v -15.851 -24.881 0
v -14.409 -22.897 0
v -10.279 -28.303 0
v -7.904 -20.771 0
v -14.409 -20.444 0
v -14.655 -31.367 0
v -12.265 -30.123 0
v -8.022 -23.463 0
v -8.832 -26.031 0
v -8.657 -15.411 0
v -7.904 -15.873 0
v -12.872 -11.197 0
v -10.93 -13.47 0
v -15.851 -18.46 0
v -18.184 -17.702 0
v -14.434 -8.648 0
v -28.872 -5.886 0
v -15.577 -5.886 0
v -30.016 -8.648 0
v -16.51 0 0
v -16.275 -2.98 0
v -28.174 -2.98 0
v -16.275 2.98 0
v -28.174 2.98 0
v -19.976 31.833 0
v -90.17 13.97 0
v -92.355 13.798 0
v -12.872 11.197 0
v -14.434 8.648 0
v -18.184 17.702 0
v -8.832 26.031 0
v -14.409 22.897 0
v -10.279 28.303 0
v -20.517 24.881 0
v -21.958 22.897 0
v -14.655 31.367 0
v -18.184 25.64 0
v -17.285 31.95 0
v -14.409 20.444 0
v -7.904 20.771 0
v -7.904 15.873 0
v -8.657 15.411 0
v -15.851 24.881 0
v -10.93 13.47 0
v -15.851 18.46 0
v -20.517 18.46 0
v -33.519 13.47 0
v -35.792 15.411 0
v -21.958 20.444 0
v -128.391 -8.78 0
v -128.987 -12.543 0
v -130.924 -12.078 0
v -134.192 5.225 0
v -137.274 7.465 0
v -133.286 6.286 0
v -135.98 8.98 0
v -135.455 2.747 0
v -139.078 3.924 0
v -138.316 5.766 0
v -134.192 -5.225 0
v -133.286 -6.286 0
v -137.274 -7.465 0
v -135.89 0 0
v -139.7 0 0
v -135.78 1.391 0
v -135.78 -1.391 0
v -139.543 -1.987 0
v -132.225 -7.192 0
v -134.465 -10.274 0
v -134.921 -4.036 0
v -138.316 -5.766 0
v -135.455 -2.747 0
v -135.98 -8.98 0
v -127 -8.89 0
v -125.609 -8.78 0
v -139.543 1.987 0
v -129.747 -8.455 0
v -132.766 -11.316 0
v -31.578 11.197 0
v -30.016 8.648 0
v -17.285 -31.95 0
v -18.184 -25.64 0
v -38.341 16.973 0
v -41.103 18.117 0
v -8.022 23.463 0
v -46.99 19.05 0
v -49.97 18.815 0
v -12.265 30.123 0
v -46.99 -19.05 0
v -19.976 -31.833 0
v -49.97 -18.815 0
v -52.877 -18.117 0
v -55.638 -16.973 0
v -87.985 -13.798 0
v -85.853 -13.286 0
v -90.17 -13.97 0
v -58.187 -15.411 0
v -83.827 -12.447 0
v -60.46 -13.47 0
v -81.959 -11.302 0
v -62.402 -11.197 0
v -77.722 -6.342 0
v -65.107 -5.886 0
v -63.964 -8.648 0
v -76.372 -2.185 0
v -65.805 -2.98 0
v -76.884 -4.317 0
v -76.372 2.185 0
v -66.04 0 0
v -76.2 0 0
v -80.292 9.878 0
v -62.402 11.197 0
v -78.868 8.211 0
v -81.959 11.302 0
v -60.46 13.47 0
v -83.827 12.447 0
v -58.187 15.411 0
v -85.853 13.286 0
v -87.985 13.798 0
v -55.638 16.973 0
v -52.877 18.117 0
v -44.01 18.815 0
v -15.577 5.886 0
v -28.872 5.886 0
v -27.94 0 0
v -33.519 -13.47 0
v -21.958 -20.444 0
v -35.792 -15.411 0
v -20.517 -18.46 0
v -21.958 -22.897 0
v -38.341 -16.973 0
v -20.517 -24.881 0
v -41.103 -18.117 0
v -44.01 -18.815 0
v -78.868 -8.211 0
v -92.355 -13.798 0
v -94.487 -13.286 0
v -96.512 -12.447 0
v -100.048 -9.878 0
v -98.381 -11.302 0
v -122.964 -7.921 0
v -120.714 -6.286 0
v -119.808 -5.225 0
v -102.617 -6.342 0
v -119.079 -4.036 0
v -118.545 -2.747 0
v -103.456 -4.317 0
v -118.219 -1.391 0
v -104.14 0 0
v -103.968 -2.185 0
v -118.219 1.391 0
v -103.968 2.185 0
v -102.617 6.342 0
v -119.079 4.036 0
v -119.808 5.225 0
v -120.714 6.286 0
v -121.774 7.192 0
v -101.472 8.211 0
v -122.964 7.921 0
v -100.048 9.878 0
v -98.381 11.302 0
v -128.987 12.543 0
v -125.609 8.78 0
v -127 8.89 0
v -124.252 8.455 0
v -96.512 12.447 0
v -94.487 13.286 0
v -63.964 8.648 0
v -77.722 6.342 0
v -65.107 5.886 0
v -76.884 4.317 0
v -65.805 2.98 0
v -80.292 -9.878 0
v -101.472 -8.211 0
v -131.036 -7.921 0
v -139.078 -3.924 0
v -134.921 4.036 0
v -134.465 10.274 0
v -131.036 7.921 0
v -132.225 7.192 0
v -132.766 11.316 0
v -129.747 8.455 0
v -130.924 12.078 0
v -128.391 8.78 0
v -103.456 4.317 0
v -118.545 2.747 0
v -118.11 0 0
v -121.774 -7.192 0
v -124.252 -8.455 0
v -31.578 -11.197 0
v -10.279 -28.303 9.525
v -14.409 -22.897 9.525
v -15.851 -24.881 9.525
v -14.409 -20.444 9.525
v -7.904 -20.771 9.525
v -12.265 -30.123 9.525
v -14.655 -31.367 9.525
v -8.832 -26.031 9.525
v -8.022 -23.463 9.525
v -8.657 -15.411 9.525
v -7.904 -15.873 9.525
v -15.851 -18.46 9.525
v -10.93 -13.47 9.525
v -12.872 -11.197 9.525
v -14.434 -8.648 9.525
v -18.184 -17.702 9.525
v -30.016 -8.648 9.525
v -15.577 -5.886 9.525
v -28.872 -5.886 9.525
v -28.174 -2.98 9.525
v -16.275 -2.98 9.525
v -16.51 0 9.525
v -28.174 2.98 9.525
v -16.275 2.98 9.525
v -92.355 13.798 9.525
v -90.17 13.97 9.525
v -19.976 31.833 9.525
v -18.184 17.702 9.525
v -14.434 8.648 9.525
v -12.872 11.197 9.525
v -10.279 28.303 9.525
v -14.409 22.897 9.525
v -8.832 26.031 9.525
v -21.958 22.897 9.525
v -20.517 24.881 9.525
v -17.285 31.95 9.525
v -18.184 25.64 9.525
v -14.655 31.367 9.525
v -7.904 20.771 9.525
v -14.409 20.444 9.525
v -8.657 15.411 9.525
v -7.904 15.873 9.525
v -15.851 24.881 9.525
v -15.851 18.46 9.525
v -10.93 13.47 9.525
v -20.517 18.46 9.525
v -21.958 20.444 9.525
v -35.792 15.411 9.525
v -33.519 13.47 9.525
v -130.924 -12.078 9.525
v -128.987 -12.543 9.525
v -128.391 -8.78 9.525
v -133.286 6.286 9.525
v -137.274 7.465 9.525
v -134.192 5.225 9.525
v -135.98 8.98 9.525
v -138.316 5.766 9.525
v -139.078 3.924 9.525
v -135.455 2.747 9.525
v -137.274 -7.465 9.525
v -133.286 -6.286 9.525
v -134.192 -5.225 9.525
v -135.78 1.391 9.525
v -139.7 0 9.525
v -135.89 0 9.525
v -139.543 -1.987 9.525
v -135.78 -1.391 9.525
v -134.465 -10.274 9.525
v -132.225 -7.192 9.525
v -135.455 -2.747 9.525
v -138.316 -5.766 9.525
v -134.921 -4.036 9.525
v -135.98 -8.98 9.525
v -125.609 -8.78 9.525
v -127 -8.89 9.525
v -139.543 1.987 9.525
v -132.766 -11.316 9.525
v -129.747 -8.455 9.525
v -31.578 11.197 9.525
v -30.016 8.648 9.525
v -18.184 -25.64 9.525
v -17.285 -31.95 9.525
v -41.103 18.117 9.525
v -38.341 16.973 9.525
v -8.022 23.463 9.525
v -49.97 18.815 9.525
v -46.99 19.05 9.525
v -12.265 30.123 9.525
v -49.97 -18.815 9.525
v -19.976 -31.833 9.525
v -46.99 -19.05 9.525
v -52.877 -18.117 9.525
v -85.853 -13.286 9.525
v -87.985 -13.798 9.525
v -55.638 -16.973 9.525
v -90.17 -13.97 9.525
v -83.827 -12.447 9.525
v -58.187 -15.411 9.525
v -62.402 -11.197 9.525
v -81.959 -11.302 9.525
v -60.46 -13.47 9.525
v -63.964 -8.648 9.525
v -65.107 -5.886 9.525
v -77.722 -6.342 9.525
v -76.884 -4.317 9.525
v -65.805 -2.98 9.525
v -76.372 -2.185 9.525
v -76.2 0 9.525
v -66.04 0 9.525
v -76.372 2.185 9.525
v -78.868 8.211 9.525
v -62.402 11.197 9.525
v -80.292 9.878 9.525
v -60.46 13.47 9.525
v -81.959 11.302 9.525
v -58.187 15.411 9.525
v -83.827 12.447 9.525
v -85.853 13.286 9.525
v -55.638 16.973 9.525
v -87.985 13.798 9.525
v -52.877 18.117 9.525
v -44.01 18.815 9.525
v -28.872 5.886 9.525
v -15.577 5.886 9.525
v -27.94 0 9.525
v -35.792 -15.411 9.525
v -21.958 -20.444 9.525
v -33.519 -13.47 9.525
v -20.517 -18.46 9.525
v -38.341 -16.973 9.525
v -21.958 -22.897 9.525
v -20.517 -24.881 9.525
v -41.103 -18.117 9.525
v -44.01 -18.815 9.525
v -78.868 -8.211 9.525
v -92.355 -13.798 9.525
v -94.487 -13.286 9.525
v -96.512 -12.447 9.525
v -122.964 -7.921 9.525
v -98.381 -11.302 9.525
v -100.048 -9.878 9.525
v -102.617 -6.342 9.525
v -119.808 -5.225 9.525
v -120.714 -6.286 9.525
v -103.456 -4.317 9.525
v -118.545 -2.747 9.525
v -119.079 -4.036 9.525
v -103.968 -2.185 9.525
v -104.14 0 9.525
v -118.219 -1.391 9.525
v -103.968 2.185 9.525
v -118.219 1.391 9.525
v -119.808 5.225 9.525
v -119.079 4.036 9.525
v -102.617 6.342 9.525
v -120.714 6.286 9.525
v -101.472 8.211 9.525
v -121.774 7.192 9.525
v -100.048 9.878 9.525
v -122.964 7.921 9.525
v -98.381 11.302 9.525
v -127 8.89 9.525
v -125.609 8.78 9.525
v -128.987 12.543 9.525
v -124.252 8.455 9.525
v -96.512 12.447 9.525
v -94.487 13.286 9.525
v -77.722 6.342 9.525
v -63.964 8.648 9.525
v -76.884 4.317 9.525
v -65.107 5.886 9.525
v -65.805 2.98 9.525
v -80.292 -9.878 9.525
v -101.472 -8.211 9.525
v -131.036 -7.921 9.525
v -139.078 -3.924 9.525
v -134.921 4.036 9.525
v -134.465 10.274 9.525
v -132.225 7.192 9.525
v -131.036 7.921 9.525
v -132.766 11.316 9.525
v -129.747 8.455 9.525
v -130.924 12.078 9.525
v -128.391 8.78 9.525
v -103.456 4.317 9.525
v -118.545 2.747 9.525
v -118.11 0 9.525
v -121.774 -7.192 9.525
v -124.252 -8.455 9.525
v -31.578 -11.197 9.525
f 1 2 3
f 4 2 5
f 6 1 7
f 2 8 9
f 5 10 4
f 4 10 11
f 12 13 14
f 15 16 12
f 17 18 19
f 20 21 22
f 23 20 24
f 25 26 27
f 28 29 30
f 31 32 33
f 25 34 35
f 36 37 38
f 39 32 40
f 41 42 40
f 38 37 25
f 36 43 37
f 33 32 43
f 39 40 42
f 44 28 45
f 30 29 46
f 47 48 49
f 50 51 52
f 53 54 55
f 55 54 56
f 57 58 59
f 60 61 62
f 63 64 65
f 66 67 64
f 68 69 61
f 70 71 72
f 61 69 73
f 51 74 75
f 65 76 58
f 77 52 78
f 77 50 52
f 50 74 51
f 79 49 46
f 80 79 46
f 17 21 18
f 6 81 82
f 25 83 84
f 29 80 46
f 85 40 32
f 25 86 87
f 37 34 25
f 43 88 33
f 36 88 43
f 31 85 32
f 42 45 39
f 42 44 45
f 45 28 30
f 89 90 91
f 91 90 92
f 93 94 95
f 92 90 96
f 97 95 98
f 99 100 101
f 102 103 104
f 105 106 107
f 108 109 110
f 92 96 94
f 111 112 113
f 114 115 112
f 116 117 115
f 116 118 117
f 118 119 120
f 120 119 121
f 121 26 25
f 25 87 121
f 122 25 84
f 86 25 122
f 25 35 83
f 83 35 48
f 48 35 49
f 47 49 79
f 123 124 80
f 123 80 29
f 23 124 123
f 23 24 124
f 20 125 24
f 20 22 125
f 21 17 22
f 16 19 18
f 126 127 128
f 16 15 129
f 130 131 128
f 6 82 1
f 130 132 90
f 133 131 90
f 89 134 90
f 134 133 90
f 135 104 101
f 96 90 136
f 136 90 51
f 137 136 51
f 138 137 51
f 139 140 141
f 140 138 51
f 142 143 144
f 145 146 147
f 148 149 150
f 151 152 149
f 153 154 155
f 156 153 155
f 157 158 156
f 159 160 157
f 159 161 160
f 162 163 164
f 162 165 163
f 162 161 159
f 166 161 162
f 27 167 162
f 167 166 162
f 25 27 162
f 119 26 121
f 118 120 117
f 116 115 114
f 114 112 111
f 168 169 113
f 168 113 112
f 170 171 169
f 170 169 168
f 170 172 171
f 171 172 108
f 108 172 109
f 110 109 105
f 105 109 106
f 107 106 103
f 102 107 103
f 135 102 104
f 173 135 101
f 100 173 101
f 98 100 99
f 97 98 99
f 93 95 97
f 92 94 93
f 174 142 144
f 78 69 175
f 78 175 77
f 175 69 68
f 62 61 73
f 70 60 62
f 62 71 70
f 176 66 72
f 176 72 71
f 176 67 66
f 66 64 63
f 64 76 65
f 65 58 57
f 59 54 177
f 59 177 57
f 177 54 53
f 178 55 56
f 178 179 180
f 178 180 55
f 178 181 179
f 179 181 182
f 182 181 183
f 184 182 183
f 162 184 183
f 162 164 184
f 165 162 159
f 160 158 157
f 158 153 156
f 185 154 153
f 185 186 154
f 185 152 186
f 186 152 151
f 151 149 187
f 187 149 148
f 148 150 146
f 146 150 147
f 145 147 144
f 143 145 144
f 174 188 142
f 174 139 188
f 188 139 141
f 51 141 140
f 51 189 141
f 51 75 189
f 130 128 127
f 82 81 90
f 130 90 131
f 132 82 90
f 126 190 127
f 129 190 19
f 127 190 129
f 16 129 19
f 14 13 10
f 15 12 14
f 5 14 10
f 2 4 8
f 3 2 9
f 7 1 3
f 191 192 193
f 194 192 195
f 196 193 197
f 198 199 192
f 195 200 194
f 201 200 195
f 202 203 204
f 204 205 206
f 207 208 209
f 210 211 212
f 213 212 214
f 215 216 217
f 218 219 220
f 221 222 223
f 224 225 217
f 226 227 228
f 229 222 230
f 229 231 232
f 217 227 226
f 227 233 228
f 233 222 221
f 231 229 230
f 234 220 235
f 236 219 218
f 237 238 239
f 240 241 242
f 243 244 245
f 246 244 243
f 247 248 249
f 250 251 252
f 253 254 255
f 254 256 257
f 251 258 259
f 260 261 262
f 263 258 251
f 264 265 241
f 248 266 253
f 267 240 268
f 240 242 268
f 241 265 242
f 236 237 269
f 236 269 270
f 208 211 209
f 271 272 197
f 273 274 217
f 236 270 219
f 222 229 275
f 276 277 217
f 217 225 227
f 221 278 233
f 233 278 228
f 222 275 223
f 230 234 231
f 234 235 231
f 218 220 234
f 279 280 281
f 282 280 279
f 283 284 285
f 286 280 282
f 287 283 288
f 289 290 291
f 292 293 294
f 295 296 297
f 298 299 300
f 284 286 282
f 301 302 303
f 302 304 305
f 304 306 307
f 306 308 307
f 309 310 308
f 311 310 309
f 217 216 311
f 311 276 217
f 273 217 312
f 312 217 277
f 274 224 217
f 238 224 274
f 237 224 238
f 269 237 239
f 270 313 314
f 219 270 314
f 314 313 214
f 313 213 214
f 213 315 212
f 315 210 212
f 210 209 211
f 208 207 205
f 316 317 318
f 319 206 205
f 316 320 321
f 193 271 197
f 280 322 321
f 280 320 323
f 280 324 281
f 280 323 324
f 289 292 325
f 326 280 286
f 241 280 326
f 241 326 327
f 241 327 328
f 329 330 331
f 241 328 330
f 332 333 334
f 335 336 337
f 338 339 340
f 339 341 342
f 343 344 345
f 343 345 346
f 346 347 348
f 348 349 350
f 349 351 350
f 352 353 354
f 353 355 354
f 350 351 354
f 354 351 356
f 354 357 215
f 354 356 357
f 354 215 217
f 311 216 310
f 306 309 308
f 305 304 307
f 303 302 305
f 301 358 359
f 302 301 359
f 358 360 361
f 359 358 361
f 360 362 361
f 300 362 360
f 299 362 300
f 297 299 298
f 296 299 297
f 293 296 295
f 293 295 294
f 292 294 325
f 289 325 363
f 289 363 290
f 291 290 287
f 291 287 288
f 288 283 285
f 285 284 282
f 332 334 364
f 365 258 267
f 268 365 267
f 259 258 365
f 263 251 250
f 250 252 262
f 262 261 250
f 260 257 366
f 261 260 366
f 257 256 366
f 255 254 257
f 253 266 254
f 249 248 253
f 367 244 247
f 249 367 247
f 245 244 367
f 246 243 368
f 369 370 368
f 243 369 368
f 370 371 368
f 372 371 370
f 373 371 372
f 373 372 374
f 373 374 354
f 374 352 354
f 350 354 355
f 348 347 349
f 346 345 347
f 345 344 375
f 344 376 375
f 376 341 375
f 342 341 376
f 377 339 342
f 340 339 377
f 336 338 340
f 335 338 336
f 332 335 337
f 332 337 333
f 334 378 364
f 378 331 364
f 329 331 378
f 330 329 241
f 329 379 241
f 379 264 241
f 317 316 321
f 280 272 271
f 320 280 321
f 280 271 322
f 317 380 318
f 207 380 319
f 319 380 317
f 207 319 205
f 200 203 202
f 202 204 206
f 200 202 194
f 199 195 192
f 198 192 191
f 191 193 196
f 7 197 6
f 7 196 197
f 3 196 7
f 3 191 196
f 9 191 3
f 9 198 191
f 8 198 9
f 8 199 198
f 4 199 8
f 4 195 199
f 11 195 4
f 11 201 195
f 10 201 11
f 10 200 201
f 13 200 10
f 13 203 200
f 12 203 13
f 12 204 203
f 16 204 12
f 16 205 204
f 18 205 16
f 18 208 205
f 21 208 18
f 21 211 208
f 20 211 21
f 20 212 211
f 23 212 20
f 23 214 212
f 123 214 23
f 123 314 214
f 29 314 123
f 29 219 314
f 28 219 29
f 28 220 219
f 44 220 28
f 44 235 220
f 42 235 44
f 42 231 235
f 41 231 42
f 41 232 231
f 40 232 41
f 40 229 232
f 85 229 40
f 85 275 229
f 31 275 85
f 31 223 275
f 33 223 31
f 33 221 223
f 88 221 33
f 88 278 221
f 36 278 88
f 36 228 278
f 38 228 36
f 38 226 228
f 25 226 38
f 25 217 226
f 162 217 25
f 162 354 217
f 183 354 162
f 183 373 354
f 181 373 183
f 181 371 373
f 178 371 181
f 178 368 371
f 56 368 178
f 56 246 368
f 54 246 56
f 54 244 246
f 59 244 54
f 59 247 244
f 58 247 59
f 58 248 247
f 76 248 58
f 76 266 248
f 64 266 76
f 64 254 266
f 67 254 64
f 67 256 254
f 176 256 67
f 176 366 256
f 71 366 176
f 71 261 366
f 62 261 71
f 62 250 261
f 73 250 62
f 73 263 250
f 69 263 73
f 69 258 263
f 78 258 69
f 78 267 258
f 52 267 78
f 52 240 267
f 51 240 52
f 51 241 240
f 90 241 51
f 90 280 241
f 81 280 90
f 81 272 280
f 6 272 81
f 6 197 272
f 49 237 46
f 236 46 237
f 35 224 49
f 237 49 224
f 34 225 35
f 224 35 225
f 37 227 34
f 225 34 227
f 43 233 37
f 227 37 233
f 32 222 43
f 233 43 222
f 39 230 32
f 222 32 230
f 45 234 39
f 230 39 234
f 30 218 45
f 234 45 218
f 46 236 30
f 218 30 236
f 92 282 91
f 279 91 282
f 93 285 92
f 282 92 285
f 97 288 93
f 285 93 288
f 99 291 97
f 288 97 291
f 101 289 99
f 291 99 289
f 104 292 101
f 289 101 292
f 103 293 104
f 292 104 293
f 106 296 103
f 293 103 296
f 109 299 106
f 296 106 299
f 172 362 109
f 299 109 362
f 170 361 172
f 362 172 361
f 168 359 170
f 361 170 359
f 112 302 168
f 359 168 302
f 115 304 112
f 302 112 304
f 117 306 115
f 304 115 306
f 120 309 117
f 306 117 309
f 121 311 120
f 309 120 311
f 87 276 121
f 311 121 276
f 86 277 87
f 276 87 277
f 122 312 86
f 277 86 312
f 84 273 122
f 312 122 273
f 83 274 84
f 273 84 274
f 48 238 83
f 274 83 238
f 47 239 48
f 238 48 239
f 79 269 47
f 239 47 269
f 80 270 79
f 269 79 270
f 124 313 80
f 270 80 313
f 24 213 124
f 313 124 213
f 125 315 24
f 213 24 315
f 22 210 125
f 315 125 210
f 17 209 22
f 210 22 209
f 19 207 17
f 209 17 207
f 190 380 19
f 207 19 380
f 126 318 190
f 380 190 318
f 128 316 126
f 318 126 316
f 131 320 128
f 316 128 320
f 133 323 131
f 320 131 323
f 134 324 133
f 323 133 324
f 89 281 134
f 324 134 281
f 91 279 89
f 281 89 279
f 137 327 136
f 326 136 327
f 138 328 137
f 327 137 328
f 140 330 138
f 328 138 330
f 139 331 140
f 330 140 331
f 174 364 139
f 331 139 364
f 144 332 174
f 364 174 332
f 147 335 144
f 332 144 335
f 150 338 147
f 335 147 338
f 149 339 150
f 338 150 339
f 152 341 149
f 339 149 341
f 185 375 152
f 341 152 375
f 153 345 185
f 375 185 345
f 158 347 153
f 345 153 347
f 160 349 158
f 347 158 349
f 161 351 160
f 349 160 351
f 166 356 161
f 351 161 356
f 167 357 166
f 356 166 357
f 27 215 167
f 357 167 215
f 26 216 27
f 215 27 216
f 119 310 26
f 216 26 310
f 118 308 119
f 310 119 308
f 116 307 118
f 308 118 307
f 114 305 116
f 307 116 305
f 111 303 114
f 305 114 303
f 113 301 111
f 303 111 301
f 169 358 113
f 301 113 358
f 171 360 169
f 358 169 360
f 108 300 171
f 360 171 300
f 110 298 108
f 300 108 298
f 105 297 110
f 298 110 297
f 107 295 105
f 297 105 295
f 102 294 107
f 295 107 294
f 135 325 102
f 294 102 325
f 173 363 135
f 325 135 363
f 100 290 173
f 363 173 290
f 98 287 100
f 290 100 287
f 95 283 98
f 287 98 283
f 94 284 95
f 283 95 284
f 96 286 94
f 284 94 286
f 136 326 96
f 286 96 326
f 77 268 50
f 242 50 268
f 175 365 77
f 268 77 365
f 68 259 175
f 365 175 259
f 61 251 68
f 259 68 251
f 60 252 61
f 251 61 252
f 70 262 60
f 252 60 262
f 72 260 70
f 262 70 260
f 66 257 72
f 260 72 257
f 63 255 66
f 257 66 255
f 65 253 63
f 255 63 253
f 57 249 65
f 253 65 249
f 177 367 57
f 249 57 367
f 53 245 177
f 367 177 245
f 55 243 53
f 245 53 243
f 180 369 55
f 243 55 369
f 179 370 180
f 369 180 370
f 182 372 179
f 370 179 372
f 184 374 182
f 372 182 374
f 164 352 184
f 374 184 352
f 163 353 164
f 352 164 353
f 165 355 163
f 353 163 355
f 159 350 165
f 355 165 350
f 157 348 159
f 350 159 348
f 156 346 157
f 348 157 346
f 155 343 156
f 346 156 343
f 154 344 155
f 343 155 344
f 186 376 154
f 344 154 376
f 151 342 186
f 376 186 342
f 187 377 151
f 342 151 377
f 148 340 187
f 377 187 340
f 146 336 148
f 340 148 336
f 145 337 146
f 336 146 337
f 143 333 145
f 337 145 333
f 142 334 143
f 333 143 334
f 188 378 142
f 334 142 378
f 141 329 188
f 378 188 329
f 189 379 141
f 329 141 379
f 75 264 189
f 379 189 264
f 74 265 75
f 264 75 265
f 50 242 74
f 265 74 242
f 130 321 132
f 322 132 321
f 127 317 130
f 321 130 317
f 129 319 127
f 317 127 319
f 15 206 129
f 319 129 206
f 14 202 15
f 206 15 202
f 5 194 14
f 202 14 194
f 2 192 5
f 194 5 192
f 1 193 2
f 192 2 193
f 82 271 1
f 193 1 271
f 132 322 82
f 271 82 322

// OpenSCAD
// file: ../Math/Triangles.scad
// Pythagorean Theorem
function pyth_A_B(a,b) = sqrt(pow(a, 2) + pow(b, 2));
function pyth_A_C(a,c) = sqrt(pow(c, 2) - pow(a, 2));
function pyth_B_C(b,c) = sqrt(pow(c, 2) - pow(b, 2));

// Heron's Formula for Triangle Area
function heron_triangle_area(a,b,c) = sqrt(
    ((a+b+c)/2)
    * (((a+b+c)/2) - a)
    * (((a+b+c)/2) - b)
    * (((a+b+c)/2) - c)
  );

function heron_triangle_height(a,b,c) = 2 * heron_triangle_area(a,b,c) / c;
// file: ../Components.scad
include <Math/Triangles.scad>;
include <Vitamins/Angle Stock.scad>;
include <Vitamins/Pipe.scad>;
include <Vitamins/Rod.scad>;

//
// Component Dimensions
//
$fn=60;

// Fascist Settings
overall_length = 26.5;
barrel_length = 18.5;

// Configurable: Wall Thickness
tee_overlap             = 3/16;

rope_od                 = 6/32;

// Configurable: Cylinder
cylinder_spindle_diameter    = 1/8;
cylinder_spindle_wall        = 5/16;
revolver_cylinder_wall       = PipeWall(PipeOneInch);
revolver_cylinder_outer_wall = 3/64;
spindle_overlap              = revolver_cylinder_wall;
revolver_zigzag_pin_diameter = 4/32;
revolver_zigzag_depth        = 3/16;
revolver_shots               = 6;
zigzag_clearance             = 1/64;
chamber_length               = 3;
chamber_seal_overlap         = 1/4;
spindle_collar_diameter      = 0.505;
spindle_collar_height        = 0.27;
actuator_cylinder_clearance  = 0.1;

// Configurable: Vitamin Selection
railRod        = RodFiveSixteenthInch;
breechBushing  = BushingThreeQuarterInch;
barrelPipe     = TubingOnePointOneTwoFive;
stockPipe      = PipeThreeQuartersInch;
receiverTee    = TeeThreeQuarterInch;
gasSealingPipe = PipeOneInch;

// Configurable: Common Settings
bottomRailAngle = 50;

// Configurable: Forend
forend_length = 2;
forend_wall_thickness = 3/16;

// AR15 grip info
grip_width                 = 0.85;
grip_height                = 1.27;


// Calculated: Revolver Cylinder
zigzag_width = revolver_zigzag_pin_diameter + zigzag_clearance*2;
revolver_cylinder_radius = (PipeOuterDiameter(PipeThreeQuartersInch)*1.5)+revolver_cylinder_wall + revolver_cylinder_outer_wall + revolver_zigzag_depth;
revolver_cylinder_od   = revolver_cylinder_radius*2;
cylinder_circumference = 3.14 * pow(revolver_cylinder_od/2, 2);
revolver_center_offset = PipeOuterDiameter(PipeThreeQuartersInch) + revolver_cylinder_wall;
rotation_angle = 360/revolver_shots;
rotation_arc = cylinder_circumference/revolver_shots;
zigzag_height = rotation_arc/2 + revolver_zigzag_pin_diameter*2;
revolver_cylinder_height = zigzag_height + revolver_zigzag_pin_diameter*2.5;
chamber_protrusion = (chamber_length - revolver_cylinder_height)/2;

top_slot_height = revolver_zigzag_pin_diameter*2;
bottom_slot_height = revolver_zigzag_pin_diameter*2 + zigzag_clearance*1.5;
// file: ../Vitamins/Angle Stock.scad
AngleStockWidth                   = 1;
AngleStockThickness               = 2;
AngleStockTrough                  = 3; // Thickness across the "elbow" of the angle
AngleStockWidthClearanceSnug      = 4;
AngleStockWidthClearanceLoose     = 5;
AngleStockThicknessClearanceSnug  = 6;
AngleStockThicknessClearanceLoose = 7;
AngleStockHeight                  = 8;

// .747
// .744
// .745
//.740


//.749
//.75
AngleStockThreeQuartersByOneEighthInch = [
  [AngleStockWidth,                   0.771],
  [AngleStockThickness,               0.13],
  [AngleStockTrough,                  0.235],
  [AngleStockWidthClearanceSnug,      0.008],
  [AngleStockWidthClearanceLoose,     0.015],
  [AngleStockThicknessClearanceSnug,  0.007],
  [AngleStockThicknessClearanceLoose, 0.008],
  [AngleStockHeight,                  0.574]
];

3_4_angle_stock_width                     = 3/4;
3_4_angle_stock_thickness                 = 0.13;
3_4_angle_stock_trough                    = 0.235;
3_4_angle_stock_height                    = 0.574;
3_4_angle_stock_width_clearance           = 0.008;
3_4_angle_stock_width_clearance_loose     = 0.008;
3_4_angle_stock_thickness_clearance       = 0.005;
3_4_angle_stock_thickness_clearance_loose = 0.007;

// trough is a percentage: 0.0-1.0
module AngleStock(stock=AngleStockThreeQuartersByOneEighthInch, trough=.5, thicknessClearance=AngleStockThicknessClearanceLoose, widthClearance=AngleStockWidthClearanceLoose, length=1) {

  // A percentage of the inner-side length (width - thickness)
  clearThicknessOffset = thicknessClearance != undef ? lookup(thicknessClearance, stock) : 0;
  clearWidthOffset     = widthClearance     != undef ? lookup(widthClearance, stock)     : 0;
  troughOffset         = (trough * (lookup(AngleStockWidth, stock) - lookup(AngleStockThickness, stock))) + lookup(AngleStockThickness, stock);

  linear_extrude(height=length)
  polygon(points=[[0,0],
                  [lookup(AngleStockWidth, stock)+clearWidthOffset,0],                                                         // X-POS Outer Corner
                  [lookup(AngleStockWidth, stock)+clearWidthOffset,lookup(AngleStockThickness, stock)+clearThicknessOffset],   // X-POS Inner Corner
                  [troughOffset,lookup(AngleStockThickness, stock)+clearThicknessOffset],                                      // X-POS Trough
                  [lookup(AngleStockThickness, stock)+clearThicknessOffset,troughOffset],                                      // Y-POS Trough
                  [lookup(AngleStockThickness, stock)+clearThicknessOffset,lookup(AngleStockWidth, stock)+clearWidthOffset],   // Y-POS Inner Corner
                  [0,lookup(AngleStockWidth, stock)+clearWidthOffset],                                                         // Y-POS Outer Corner
          ],
          paths=[[0,1,2,3,4,5,6]]);
}


//#AngleStock();

module 3_4_angle_stock(length=1, cutter=false, loose=false) {
  width_clearance     = loose ? 3_4_angle_stock_width_clearance_loose     : 3_4_angle_stock_width_clearance;
  thickness_clearance = loose ? 3_4_angle_stock_thickness_clearance_loose : 3_4_angle_stock_thickness_clearance;

  union() {
    if (cutter) {
      translate([-width_clearance,-thickness_clearance,0])
      cube([3_4_angle_stock_width     + width_clearance*2,
            3_4_angle_stock_thickness + thickness_clearance*2,
            length]);

      translate([-width_clearance,-thickness_clearance,0])
      cube([3_4_angle_stock_thickness + thickness_clearance*2,
            3_4_angle_stock_width     + width_clearance*2,
            length]);

      translate([3_4_angle_stock_thickness/2, 3_4_angle_stock_thickness/2, 0])
      difference() {
        cube([3_4_angle_stock_trough + thickness_clearance/2,
              3_4_angle_stock_trough + thickness_clearance/2,
              length]);

        translate([3_4_angle_stock_trough + thickness_clearance/2,
                   thickness_clearance/2,
                   -0.1])
        rotate([0,0,45])
        cube([3_4_angle_stock_trough*sqrt(2),
              3_4_angle_stock_trough*sqrt(2),
              length + 0.2]);
      }

    } else {
      cube([3_4_angle_stock_width,3_4_angle_stock_thickness,length]);
      cube([3_4_angle_stock_thickness,3_4_angle_stock_width,length]);

      translate([3_4_angle_stock_thickness, 3_4_angle_stock_thickness, 0])
      difference() {
        cube([3_4_angle_stock_trough, 3_4_angle_stock_trough,length]);

        translate([3_4_angle_stock_trough,0,-0.1])
        rotate([0,0,45])
        cube([3_4_angle_stock_trough*sqrt(2), 3_4_angle_stock_trough*sqrt(2),length + 0.2]);
      }
    }
  };
}
// file: ../Forend Rail.scad
include <Vitamins/Pipe.scad>;
include <Vitamins/Angle Stock.scad>;
include <Components.scad>;

function ForendRailOffset(receiverTee=receiverTee,
                          teeOverlap=tee_overlap,
                          railRod=railRod) =
      (lookup(TeeRimDiameter, receiverTee)/2) + teeOverlap
     + lookup(RodRadius, railRod);


module ForendRods(receiverTee=receiverTee, railRod=railRod,
                  clearance=undef, angles=[180,50,-50], rodFnAngle=90) {
    for (angle = angles)
    rotate([0,0,angle])
    translate([-ForendRailOffset(railRod=railRod), 0])
    rotate([0,0,-angle+rodFnAngle])
    Rod2d(rod=railRod, clearance=clearance);
}

module ForendRail(receiverTee=receiverTee, barrelPipe=barrelPipe,
                  railRod=railRod, railClearance=RodClearanceLoose,
                  wall=tee_overlap,angles=[180,50,-50]) {

  // Debugging reference
  *%TeeRim(receiverTee);

  difference() {
    hull()
    union() {
      for (angle = angles)
      rotate([0,0,angle])
      translate([-ForendRailOffset(railRod=railRod, teeOverlap=tee_overlap), 0])
      circle(r=RodRadius(railRod) + wall, $fn=24);

    }

    ForendRods(angles=angles, clearance=railClearance);
  }
}

*render(convexity=2)
linear_extrude(height=1)
ForendRail();
// file: ../Vitamins/Rod.scad
RodDiameter       = 1;
RodRadius         = 2;
RodClearanceSnug  = 3;
RodClearanceLoose = 4;
RodFn             = 5;

RodOneEighthInch = [
  [RodDiameter, 1/8],
  [RodRadius, 1/8/2],
  [RodClearanceSnug, 0.02],
  [RodClearanceLoose, 0.03],
  [RodFn, 8]
];

RodOneQuarterInch = [
  [RodDiameter,       1/4],
  [RodRadius,         1/4/2],
  [RodClearanceSnug,  0.027],
  [RodClearanceLoose, 0.035],
  [RodFn,             8]
];

RodFiveSixteenthInch = [
  [RodDiameter,       5/16],
  [RodRadius,         5/16/2],
  [RodClearanceSnug,  0.025],
  [RodClearanceLoose, 0.025],
  [RodFn,             10]
];

RodThreeQuarterInchTubing = [
  [RodDiameter,       0.758],
  [RodRadius,         0.758/2],
  [RodClearanceSnug,  0.023],
  [RodClearanceLoose, 0.029],
  [RodFn,             30]
];

/**
 * Lookup the diameter of a rod.
 * @param rod The rod to lookup.
 * @param clearance The RodClearance to use.
 */
function RodDiameter(rod=undef, clearance=undef)
           = lookup(RodDiameter, rod)
          + (clearance != undef ? lookup(clearance, rod) : 0);

/**
 * Lookup the radius of a rod.
 * @param rod The rod to lookup.
 * @param clearance The RodClearance to use.
 */
function RodRadius(rod, clearance=undef) = RodDiameter(rod, clearance)/2;

/**
 * Lookup the $fn value for a rod, optionally overriding it
 * @param rod The rod to lookup.
 * @param $fn Override the RodFn. If defined, this will be the result. (convenience arg)
 **/
function RodFn(rod, $fn=undef) = ($fn == undef) ? lookup(RodFn, rod) : $fn;

/**
 * A 2D rod (circle).
 * @param rod The rod to render.
 * @param clearance The RodClearance to use.
 * @param $fn Override the RodFn value of the rod.
 */
module Rod2d(rod=RodOneQuarterInch, clearance=undef, $fn=undef) {
  circle(r=RodRadius(rod, clearance),
         $fn=RodFn(rod, $fn));
}


module Rod(rod=RodOneQuarterInch, length=1, clearance=undef, center=false, $fn=undef) {
  render(convexity=1)
  linear_extrude(height=length, center=center)
  Rod2d(rod, clearance, $fn=$fn);
}

// 1/8" Rod
1_8_rod_d                = 1/8;
1_8_rod_r                = 1_8_rod_d/2;
1_8_rod_clearance        = 0.02;
1_8_rod_clearance_loose  = 0.03;

// 1/4" Rod
1_4_rod_d                = 1/4;
1_4_rod_r                = 1_4_rod_d/2;
1_4_rod_clearance        = 0.01;
1_4_rod_clearance_loose  = 0.015;
1_4_rod_collar_d         = 1/22;
1_4_rod_collar_width     = 0.27;
1_4_rod_collar_clearance = 0.0; // TODO

// 5/16" Rod
5_16_rod_d                = 5/16;
5_16_rod_r                = 5_16_rod_d/2;
5_16_rod_clearance        = 0.02; // TODO
5_16_rod_clearance_loose  = 0.02;

module rod(diameter=1, length=1, clearance=0, clearance_loose=0, loose=false, cutter=false, center=false, $fn=20) {
  clearance = loose ? clearance_loose : clearance;

  if (cutter) {
    cylinder(r=(diameter/2) + (loose ? clearance_loose : clearance), h=length, center=center);
  } else {
    cylinder(r=diameter/2, h=length, center=center);
  }
}

module 1_8_rod(length=1, loose=false, cutter=false, center=false) {
  rod(diameter=1_8_rod_d,
      clearance=1_8_rod_clearance,
      clearance_loose=1_8_rod_clearance_loose,
      length=length,
      cutter=cutter,
      center=center);
}

module 1_4_rod(length=1, loose=false, cutter=false, center=false) {
  rod(diameter=1_4_rod_d,
      clearance=1_4_rod_clearance,
      clearance_loose=1_4_rod_clearance_loose,
      loose=loose,
      length=length,
      cutter=cutter,
      center=center);
}

module 1_4_rod_collar(cutter=false) {
  rod(diameter=1_4_rod_collar_d,
      clearance=1_4_rod_collar_clearance,
      cutter=cutter,
      length=1_4_rod_collar_width);
}

module 5_16_rod(length=1, loose=false, cutter=false, center=false) {
  rod(diameter=5_16_rod_d,
      clearance=5_16_rod_clearance,
      clearance_loose=5_16_rod_clearance_loose,
      length=length,
      cutter=cutter,
      center=center);
}
// file: ../Vitamins/Pipe.scad
//
// Pipe dimensions
//
PipeInnerDiameter   = 1; // Inner Diameter of pipe, smallest measurement if asymmetrical
PipeOuterDiameter   = 2; // Outer Diameter of pipe, largest measurement if asymmetrical
PipeTaperedDiameter = 3; // Threads are tapered, smallest measurement if asymmetrical
PipeThreadLength    = 4; // Total length of the pipe thread
PipeThreadDepth     = 5; // Depth when fully seated
PipeClearanceSnug   = 6; // Added to the diameter, should not slip (default)
PipeClearanceLoose  = 7; // Added to the diameter, should slide freely
PipeFn              = 8; // Number of sides
PipeWeightPerUnit   = 9;

function PipeClearance(pipe, clearance)     = (clearance != undef) ? lookup(clearance, pipe) : 0;
function PipeOuterDiameter(pipe, clearance) = lookup(PipeOuterDiameter, pipe) + PipeClearance(pipe, clearance);
function PipeInnerDiameter(pipe, clearance) = lookup(PipeInnerDiameter, pipe) + PipeClearance(pipe, clearance);
function PipeOuterRadius(pipe, clearance)   = PipeOuterDiameter(pipe, clearance)/2;
function PipeInnerRadius(pipe, clearance)   = PipeInnerDiameter(pipe, clearance)/2;
function PipeWall(pipe)                     = PipeOuterRadius(pipe) - PipeInnerRadius(pipe);
function PipeFn(pipe)                       = lookup(PipeFn, pipe);

module Pipe2d(pipe, clearance=PipeClearanceSnug) {
  echo("PipeOuterRadius,PipeClearance: ", PipeOuterRadius(pipe=pipe, clearance=clearance), clearance);
  circle(r=PipeOuterRadius(pipe=pipe, clearance=PipeClearanceSnug), $fn=lookup(PipeFn, pipe));
};
module Pipe(pipe, length = 1, clearance=PipeClearanceSnug, center=false) {
  translate([0,0,center ? -length/2 : 0])
  linear_extrude(height=length)
  Pipe2d(pipe=pipe, clearance=clearance);
};

//Pipe(PipeOneInch, clearance=PipeClearanceLoose);


// 1/4" Pipe
PipeOneQuarterInch = [
  [PipeInnerDiameter,   0.265],
  [PipeOuterDiameter,   0.415],
  [PipeTaperedDiameter, 0.415], // TODO: Verify
  [PipeThreadLength,    0.5],   // TODO: Verify
  [PipeThreadDepth,     0.25],  // TODO: Verify
  [PipeClearanceSnug,   0.015], // TODO: Verify
  [PipeClearanceLoose,  0.027], // TODO: Verify
  [PipeFn,              20],
  [PipeWeightPerUnit,   0] // TODO
];

// 12GaugeChamber - 12ga Chamber tolerances are much pickier than ERW pipe
12GaugeChamber = [
  [PipeInnerDiameter,   0.78],
  [PipeFn,              30]
];

// 3/4" Pipe
PipeThreeQuartersInch = [
  [PipeInnerDiameter,   0.81],
  [PipeOuterDiameter,   1.07],
  [PipeTaperedDiameter, 1.018],
  [PipeThreadLength,    0.9],
  [PipeThreadDepth,     0.5],
  [PipeClearanceSnug,   0.005],
  [PipeClearanceLoose,  0.027],
  [PipeFn,              30],
  [PipeWeightPerUnit,   40]
];

// 1.125" DOM Tubing
TubingOnePointOneTwoFive = [
  [PipeInnerDiameter,   0.813],
  [PipeOuterDiameter,   1.125],
  [PipeTaperedDiameter, 1.018],
  [PipeThreadLength,    0.9],
  [PipeThreadDepth,     0.5],
  [PipeClearanceSnug,   0.020],
  [PipeClearanceLoose,  0.022],
  [PipeFn,              30],
  [PipeWeightPerUnit,   42]
];

// 1" Pipe
PipeOneInch = [
  [PipeInnerDiameter,   1.055],
  [PipeOuterDiameter,   1.315],
  [PipeTaperedDiameter, 1.285],
  [PipeThreadLength,    0.982],
  [PipeThreadDepth,     0.5], // TODO: Verify
  [PipeClearanceSnug,   0.02],
  [PipeClearanceLoose,  0.03],
  [PipeFn,              30],
  [PipeWeightPerUnit,   0] // TODO
];


// Fittings: Tee
TeeOuterDiameter = 1; // Diameter of the body, not the rim
TeeWidth         = 2; // Across the top of the tee, side-to-side
TeeHeight        = 3; // From the middle of the bottom rim to the top of the body
TeeInnerDiameter = 4; // Diameter of the threaded hole
TeeRimDiameter   = 5; // Diameter of the tee rim
TeeRimWidth      = 6; // Width of the tee rim
TeeInfillSphere  = 7; // Diameter of the infill sphere, cuts out the casting infill between the tee sections
TeeInfillOffset  = 8; // Offset for the infill sphere from center

TeeThreeQuarterInch = [
  [TeeOuterDiameter, 1.40],
  [TeeWidth,         2.64],
  [TeeHeight,        2.07],
  [TeeInnerDiameter, 0.88],
  [TeeRimDiameter,   1.54],
  [TeeRimWidth,      0.31],
  [TeeInfillSphere,  0.10],
  [TeeInfillOffset,  0.41]
];

function TeeOuterDiameter(tee) = lookup(TeeOuterDiameter, tee);
function TeeOuterRadius(tee)   = lookup(TeeOuterDiameter, tee)/2;
function TeeWidth(tee)         = lookup(TeeWidth, tee);
function TeeHeight(tee)        = lookup(TeeHeight, tee);
function TeeInnerDiameter(tee) = lookup(TeeInnerDiameter, tee);
function TeeInnerRadius(tee)   = lookup(TeeInnerDiameter, tee)/2;
function TeeRimDiameter(tee)   = lookup(TeeRimDiameter, tee);
function TeeRimRadius(tee)     = lookup(TeeRimDiameter, tee)/2;
function TeeRimWidth(tee)      = lookup(TeeRimWidth, tee);
function TeeCenter(tee)        = lookup(TeeHeight, tee) - TeeOuterRadius(tee);

module TeeTetris_Side(tee) {
  rotate([0,90,0])
  translate([TeeWidth(tee)/2,0,-TeeCenter(tee)])
  Tee(tee=tee);
}

module Tee(tee, $fn=40) {
   union() {

     // Top Body
     rotate([0,-90,0])
     translate([TeeHeight(tee) - (TeeOuterDiameter(tee)/2),0,0])
     cylinder(r=TeeOuterRadius(tee), h=TeeWidth(tee) * 0.99, center=true, $fn=36);

     // Bottom Body
     translate([0,0,TeeCenter(tee) * 0.01])
     cylinder(r=TeeOuterRadius(tee), h=TeeCenter(tee) * 0.98, $fn=36);

     // Bottom Rim
     cylinder(r=TeeRimRadius(tee), h=TeeRimWidth(tee), $fn=36);


    // Rims
    for (i = [1, -1]) {

      // Rim
      translate([i*TeeWidth(tee)/2,0,TeeCenter(tee)])
      rotate([0,i*-90,0]) {
      cylinder(r=TeeRimRadius(tee), h=TeeRimWidth(tee), $fn=36);

      // Casting Infill
      translate([0,0,TeeRimWidth(tee)])
      cylinder(r1=TeeRimRadius(tee),
               r2=TeeOuterRadius(tee),
                h=TeeRimWidth(tee)*1/4,
                $fn=36);
      }
    }

    // Tee Body Casting Infill
    // TODO: Tweak this? Could be better, could be worse.
    intersection() {
      translate([0,0,TeeCenter(tee) + lookup(TeeInfillSphere, tee)])
      sphere(r=TeeRimRadius(tee) + lookup(TeeInfillOffset, tee), $fn=36);

      translate([-TeeRimRadius(tee),-TeeOuterRadius(tee),0])
      cube([TeeRimDiameter(tee),TeeOuterDiameter(tee),TeeCenter(tee)]);
    }
   }
};

//Tee(TeeThreeQuarterInch);

module TeeRim(tee=TeeThreeQuarterInch, height=1, clearance=0) {
  cylinder(r=TeeRimRadius(tee) + clearance, h=height, $fn=36);
}

// Fittings: Bushings
BushingHeight    = 1;
BushingDiameter  = 2;
BushingDepth     = 3; // Bushing screws in about half an inch
BushingCapWidth  = 4;
BushingCapHeight = 5;


// 3/4" Bushing
BushingThreeQuarterInch = [
  [BushingHeight,    0.955],
  [BushingDiameter,  1.05],
  [BushingDepth,     0.49],
  [BushingCapWidth,  1.227],
  [BushingCapHeight, 0.215]
];

function BushingHeight(bushing)    = lookup(BushingHeight, bushing);
function BushingDiameter(bushing)  = lookup(BushingDiameter, bushing);
function BushingRadius(bushing)    = lookup(BushingDiameter, bushing)/2;
function BushingDepth(bushing)     = lookup(BushingDepth, bushing);
function BushingCapWidth(bushing)  = lookup(BushingCapWidth, bushing);
function BushingCapHeight(bushing) = lookup(BushingCapHeight, bushing);

module Bushing(spec=BushingThreeQuarterInch) {

  od        = lookup(BushingDiameter, spec);
  height    = lookup(BushingHeight, spec);
  capWidth  = lookup(BushingCapWidth, spec);
  capHeight = lookup(BushingCapHeight, spec);

  union() {

    // Body
    translate([0,0,capHeight/2])
    cylinder(r=BushingRadius(spec), h=height - (BushingCapHeight(spec)/2), $fn=20);

    // Head
    cylinder(r=BushingCapWidth(spec)/2, h=BushingCapHeight(spec), $fn=6);
  }
}
// main file
include <../Vitamins/Pipe.scad>;
include <../Vitamins/Rod.scad>;
use <../Forend Rail.scad>;

// TODO: Make automatic scaling of the handle holes better
module ForendWrench(receiverTee=TeeThreeQuarterInch, forendRods=RodFiveSixteenthInch, height = 3/8, wall=1/4, $fn=40,
                    handleWidth=1, handleLength=5) {
                      

  handleRadius = handleWidth/2;
  
  render(convexity=2)
  linear_extrude(height=height)
  difference() {
    
    // Main body
    hull() {
      // Body
      *circle(r=TeeRimRadius(receiverTee) + wall);
      
      // Handle Tip
      translate([-handleLength,0,0])
      circle(r=handleWidth/2);
      
      ForendRail(railRod=forendRods, angles=[50,-50], wall=wall);
    }
  
    // Forend holes
    ForendRods(railRod=forendRods, railClearance=RodClearanceSnug);
    
    // Handle Holes
    #for (i = [[handleRadius*.7, handleLength],
               [handleRadius*1.1, handleLength*.71],
               [handleRadius*1.5, handleLength*.37],
               [handleRadius*1.5, -0.1]]) {
      translate([-i[1],0,0])
      circle(r=i[0]);
    }
  }
  
}

scale([25.4, 25.4, 25.4])
ForendWrench();
